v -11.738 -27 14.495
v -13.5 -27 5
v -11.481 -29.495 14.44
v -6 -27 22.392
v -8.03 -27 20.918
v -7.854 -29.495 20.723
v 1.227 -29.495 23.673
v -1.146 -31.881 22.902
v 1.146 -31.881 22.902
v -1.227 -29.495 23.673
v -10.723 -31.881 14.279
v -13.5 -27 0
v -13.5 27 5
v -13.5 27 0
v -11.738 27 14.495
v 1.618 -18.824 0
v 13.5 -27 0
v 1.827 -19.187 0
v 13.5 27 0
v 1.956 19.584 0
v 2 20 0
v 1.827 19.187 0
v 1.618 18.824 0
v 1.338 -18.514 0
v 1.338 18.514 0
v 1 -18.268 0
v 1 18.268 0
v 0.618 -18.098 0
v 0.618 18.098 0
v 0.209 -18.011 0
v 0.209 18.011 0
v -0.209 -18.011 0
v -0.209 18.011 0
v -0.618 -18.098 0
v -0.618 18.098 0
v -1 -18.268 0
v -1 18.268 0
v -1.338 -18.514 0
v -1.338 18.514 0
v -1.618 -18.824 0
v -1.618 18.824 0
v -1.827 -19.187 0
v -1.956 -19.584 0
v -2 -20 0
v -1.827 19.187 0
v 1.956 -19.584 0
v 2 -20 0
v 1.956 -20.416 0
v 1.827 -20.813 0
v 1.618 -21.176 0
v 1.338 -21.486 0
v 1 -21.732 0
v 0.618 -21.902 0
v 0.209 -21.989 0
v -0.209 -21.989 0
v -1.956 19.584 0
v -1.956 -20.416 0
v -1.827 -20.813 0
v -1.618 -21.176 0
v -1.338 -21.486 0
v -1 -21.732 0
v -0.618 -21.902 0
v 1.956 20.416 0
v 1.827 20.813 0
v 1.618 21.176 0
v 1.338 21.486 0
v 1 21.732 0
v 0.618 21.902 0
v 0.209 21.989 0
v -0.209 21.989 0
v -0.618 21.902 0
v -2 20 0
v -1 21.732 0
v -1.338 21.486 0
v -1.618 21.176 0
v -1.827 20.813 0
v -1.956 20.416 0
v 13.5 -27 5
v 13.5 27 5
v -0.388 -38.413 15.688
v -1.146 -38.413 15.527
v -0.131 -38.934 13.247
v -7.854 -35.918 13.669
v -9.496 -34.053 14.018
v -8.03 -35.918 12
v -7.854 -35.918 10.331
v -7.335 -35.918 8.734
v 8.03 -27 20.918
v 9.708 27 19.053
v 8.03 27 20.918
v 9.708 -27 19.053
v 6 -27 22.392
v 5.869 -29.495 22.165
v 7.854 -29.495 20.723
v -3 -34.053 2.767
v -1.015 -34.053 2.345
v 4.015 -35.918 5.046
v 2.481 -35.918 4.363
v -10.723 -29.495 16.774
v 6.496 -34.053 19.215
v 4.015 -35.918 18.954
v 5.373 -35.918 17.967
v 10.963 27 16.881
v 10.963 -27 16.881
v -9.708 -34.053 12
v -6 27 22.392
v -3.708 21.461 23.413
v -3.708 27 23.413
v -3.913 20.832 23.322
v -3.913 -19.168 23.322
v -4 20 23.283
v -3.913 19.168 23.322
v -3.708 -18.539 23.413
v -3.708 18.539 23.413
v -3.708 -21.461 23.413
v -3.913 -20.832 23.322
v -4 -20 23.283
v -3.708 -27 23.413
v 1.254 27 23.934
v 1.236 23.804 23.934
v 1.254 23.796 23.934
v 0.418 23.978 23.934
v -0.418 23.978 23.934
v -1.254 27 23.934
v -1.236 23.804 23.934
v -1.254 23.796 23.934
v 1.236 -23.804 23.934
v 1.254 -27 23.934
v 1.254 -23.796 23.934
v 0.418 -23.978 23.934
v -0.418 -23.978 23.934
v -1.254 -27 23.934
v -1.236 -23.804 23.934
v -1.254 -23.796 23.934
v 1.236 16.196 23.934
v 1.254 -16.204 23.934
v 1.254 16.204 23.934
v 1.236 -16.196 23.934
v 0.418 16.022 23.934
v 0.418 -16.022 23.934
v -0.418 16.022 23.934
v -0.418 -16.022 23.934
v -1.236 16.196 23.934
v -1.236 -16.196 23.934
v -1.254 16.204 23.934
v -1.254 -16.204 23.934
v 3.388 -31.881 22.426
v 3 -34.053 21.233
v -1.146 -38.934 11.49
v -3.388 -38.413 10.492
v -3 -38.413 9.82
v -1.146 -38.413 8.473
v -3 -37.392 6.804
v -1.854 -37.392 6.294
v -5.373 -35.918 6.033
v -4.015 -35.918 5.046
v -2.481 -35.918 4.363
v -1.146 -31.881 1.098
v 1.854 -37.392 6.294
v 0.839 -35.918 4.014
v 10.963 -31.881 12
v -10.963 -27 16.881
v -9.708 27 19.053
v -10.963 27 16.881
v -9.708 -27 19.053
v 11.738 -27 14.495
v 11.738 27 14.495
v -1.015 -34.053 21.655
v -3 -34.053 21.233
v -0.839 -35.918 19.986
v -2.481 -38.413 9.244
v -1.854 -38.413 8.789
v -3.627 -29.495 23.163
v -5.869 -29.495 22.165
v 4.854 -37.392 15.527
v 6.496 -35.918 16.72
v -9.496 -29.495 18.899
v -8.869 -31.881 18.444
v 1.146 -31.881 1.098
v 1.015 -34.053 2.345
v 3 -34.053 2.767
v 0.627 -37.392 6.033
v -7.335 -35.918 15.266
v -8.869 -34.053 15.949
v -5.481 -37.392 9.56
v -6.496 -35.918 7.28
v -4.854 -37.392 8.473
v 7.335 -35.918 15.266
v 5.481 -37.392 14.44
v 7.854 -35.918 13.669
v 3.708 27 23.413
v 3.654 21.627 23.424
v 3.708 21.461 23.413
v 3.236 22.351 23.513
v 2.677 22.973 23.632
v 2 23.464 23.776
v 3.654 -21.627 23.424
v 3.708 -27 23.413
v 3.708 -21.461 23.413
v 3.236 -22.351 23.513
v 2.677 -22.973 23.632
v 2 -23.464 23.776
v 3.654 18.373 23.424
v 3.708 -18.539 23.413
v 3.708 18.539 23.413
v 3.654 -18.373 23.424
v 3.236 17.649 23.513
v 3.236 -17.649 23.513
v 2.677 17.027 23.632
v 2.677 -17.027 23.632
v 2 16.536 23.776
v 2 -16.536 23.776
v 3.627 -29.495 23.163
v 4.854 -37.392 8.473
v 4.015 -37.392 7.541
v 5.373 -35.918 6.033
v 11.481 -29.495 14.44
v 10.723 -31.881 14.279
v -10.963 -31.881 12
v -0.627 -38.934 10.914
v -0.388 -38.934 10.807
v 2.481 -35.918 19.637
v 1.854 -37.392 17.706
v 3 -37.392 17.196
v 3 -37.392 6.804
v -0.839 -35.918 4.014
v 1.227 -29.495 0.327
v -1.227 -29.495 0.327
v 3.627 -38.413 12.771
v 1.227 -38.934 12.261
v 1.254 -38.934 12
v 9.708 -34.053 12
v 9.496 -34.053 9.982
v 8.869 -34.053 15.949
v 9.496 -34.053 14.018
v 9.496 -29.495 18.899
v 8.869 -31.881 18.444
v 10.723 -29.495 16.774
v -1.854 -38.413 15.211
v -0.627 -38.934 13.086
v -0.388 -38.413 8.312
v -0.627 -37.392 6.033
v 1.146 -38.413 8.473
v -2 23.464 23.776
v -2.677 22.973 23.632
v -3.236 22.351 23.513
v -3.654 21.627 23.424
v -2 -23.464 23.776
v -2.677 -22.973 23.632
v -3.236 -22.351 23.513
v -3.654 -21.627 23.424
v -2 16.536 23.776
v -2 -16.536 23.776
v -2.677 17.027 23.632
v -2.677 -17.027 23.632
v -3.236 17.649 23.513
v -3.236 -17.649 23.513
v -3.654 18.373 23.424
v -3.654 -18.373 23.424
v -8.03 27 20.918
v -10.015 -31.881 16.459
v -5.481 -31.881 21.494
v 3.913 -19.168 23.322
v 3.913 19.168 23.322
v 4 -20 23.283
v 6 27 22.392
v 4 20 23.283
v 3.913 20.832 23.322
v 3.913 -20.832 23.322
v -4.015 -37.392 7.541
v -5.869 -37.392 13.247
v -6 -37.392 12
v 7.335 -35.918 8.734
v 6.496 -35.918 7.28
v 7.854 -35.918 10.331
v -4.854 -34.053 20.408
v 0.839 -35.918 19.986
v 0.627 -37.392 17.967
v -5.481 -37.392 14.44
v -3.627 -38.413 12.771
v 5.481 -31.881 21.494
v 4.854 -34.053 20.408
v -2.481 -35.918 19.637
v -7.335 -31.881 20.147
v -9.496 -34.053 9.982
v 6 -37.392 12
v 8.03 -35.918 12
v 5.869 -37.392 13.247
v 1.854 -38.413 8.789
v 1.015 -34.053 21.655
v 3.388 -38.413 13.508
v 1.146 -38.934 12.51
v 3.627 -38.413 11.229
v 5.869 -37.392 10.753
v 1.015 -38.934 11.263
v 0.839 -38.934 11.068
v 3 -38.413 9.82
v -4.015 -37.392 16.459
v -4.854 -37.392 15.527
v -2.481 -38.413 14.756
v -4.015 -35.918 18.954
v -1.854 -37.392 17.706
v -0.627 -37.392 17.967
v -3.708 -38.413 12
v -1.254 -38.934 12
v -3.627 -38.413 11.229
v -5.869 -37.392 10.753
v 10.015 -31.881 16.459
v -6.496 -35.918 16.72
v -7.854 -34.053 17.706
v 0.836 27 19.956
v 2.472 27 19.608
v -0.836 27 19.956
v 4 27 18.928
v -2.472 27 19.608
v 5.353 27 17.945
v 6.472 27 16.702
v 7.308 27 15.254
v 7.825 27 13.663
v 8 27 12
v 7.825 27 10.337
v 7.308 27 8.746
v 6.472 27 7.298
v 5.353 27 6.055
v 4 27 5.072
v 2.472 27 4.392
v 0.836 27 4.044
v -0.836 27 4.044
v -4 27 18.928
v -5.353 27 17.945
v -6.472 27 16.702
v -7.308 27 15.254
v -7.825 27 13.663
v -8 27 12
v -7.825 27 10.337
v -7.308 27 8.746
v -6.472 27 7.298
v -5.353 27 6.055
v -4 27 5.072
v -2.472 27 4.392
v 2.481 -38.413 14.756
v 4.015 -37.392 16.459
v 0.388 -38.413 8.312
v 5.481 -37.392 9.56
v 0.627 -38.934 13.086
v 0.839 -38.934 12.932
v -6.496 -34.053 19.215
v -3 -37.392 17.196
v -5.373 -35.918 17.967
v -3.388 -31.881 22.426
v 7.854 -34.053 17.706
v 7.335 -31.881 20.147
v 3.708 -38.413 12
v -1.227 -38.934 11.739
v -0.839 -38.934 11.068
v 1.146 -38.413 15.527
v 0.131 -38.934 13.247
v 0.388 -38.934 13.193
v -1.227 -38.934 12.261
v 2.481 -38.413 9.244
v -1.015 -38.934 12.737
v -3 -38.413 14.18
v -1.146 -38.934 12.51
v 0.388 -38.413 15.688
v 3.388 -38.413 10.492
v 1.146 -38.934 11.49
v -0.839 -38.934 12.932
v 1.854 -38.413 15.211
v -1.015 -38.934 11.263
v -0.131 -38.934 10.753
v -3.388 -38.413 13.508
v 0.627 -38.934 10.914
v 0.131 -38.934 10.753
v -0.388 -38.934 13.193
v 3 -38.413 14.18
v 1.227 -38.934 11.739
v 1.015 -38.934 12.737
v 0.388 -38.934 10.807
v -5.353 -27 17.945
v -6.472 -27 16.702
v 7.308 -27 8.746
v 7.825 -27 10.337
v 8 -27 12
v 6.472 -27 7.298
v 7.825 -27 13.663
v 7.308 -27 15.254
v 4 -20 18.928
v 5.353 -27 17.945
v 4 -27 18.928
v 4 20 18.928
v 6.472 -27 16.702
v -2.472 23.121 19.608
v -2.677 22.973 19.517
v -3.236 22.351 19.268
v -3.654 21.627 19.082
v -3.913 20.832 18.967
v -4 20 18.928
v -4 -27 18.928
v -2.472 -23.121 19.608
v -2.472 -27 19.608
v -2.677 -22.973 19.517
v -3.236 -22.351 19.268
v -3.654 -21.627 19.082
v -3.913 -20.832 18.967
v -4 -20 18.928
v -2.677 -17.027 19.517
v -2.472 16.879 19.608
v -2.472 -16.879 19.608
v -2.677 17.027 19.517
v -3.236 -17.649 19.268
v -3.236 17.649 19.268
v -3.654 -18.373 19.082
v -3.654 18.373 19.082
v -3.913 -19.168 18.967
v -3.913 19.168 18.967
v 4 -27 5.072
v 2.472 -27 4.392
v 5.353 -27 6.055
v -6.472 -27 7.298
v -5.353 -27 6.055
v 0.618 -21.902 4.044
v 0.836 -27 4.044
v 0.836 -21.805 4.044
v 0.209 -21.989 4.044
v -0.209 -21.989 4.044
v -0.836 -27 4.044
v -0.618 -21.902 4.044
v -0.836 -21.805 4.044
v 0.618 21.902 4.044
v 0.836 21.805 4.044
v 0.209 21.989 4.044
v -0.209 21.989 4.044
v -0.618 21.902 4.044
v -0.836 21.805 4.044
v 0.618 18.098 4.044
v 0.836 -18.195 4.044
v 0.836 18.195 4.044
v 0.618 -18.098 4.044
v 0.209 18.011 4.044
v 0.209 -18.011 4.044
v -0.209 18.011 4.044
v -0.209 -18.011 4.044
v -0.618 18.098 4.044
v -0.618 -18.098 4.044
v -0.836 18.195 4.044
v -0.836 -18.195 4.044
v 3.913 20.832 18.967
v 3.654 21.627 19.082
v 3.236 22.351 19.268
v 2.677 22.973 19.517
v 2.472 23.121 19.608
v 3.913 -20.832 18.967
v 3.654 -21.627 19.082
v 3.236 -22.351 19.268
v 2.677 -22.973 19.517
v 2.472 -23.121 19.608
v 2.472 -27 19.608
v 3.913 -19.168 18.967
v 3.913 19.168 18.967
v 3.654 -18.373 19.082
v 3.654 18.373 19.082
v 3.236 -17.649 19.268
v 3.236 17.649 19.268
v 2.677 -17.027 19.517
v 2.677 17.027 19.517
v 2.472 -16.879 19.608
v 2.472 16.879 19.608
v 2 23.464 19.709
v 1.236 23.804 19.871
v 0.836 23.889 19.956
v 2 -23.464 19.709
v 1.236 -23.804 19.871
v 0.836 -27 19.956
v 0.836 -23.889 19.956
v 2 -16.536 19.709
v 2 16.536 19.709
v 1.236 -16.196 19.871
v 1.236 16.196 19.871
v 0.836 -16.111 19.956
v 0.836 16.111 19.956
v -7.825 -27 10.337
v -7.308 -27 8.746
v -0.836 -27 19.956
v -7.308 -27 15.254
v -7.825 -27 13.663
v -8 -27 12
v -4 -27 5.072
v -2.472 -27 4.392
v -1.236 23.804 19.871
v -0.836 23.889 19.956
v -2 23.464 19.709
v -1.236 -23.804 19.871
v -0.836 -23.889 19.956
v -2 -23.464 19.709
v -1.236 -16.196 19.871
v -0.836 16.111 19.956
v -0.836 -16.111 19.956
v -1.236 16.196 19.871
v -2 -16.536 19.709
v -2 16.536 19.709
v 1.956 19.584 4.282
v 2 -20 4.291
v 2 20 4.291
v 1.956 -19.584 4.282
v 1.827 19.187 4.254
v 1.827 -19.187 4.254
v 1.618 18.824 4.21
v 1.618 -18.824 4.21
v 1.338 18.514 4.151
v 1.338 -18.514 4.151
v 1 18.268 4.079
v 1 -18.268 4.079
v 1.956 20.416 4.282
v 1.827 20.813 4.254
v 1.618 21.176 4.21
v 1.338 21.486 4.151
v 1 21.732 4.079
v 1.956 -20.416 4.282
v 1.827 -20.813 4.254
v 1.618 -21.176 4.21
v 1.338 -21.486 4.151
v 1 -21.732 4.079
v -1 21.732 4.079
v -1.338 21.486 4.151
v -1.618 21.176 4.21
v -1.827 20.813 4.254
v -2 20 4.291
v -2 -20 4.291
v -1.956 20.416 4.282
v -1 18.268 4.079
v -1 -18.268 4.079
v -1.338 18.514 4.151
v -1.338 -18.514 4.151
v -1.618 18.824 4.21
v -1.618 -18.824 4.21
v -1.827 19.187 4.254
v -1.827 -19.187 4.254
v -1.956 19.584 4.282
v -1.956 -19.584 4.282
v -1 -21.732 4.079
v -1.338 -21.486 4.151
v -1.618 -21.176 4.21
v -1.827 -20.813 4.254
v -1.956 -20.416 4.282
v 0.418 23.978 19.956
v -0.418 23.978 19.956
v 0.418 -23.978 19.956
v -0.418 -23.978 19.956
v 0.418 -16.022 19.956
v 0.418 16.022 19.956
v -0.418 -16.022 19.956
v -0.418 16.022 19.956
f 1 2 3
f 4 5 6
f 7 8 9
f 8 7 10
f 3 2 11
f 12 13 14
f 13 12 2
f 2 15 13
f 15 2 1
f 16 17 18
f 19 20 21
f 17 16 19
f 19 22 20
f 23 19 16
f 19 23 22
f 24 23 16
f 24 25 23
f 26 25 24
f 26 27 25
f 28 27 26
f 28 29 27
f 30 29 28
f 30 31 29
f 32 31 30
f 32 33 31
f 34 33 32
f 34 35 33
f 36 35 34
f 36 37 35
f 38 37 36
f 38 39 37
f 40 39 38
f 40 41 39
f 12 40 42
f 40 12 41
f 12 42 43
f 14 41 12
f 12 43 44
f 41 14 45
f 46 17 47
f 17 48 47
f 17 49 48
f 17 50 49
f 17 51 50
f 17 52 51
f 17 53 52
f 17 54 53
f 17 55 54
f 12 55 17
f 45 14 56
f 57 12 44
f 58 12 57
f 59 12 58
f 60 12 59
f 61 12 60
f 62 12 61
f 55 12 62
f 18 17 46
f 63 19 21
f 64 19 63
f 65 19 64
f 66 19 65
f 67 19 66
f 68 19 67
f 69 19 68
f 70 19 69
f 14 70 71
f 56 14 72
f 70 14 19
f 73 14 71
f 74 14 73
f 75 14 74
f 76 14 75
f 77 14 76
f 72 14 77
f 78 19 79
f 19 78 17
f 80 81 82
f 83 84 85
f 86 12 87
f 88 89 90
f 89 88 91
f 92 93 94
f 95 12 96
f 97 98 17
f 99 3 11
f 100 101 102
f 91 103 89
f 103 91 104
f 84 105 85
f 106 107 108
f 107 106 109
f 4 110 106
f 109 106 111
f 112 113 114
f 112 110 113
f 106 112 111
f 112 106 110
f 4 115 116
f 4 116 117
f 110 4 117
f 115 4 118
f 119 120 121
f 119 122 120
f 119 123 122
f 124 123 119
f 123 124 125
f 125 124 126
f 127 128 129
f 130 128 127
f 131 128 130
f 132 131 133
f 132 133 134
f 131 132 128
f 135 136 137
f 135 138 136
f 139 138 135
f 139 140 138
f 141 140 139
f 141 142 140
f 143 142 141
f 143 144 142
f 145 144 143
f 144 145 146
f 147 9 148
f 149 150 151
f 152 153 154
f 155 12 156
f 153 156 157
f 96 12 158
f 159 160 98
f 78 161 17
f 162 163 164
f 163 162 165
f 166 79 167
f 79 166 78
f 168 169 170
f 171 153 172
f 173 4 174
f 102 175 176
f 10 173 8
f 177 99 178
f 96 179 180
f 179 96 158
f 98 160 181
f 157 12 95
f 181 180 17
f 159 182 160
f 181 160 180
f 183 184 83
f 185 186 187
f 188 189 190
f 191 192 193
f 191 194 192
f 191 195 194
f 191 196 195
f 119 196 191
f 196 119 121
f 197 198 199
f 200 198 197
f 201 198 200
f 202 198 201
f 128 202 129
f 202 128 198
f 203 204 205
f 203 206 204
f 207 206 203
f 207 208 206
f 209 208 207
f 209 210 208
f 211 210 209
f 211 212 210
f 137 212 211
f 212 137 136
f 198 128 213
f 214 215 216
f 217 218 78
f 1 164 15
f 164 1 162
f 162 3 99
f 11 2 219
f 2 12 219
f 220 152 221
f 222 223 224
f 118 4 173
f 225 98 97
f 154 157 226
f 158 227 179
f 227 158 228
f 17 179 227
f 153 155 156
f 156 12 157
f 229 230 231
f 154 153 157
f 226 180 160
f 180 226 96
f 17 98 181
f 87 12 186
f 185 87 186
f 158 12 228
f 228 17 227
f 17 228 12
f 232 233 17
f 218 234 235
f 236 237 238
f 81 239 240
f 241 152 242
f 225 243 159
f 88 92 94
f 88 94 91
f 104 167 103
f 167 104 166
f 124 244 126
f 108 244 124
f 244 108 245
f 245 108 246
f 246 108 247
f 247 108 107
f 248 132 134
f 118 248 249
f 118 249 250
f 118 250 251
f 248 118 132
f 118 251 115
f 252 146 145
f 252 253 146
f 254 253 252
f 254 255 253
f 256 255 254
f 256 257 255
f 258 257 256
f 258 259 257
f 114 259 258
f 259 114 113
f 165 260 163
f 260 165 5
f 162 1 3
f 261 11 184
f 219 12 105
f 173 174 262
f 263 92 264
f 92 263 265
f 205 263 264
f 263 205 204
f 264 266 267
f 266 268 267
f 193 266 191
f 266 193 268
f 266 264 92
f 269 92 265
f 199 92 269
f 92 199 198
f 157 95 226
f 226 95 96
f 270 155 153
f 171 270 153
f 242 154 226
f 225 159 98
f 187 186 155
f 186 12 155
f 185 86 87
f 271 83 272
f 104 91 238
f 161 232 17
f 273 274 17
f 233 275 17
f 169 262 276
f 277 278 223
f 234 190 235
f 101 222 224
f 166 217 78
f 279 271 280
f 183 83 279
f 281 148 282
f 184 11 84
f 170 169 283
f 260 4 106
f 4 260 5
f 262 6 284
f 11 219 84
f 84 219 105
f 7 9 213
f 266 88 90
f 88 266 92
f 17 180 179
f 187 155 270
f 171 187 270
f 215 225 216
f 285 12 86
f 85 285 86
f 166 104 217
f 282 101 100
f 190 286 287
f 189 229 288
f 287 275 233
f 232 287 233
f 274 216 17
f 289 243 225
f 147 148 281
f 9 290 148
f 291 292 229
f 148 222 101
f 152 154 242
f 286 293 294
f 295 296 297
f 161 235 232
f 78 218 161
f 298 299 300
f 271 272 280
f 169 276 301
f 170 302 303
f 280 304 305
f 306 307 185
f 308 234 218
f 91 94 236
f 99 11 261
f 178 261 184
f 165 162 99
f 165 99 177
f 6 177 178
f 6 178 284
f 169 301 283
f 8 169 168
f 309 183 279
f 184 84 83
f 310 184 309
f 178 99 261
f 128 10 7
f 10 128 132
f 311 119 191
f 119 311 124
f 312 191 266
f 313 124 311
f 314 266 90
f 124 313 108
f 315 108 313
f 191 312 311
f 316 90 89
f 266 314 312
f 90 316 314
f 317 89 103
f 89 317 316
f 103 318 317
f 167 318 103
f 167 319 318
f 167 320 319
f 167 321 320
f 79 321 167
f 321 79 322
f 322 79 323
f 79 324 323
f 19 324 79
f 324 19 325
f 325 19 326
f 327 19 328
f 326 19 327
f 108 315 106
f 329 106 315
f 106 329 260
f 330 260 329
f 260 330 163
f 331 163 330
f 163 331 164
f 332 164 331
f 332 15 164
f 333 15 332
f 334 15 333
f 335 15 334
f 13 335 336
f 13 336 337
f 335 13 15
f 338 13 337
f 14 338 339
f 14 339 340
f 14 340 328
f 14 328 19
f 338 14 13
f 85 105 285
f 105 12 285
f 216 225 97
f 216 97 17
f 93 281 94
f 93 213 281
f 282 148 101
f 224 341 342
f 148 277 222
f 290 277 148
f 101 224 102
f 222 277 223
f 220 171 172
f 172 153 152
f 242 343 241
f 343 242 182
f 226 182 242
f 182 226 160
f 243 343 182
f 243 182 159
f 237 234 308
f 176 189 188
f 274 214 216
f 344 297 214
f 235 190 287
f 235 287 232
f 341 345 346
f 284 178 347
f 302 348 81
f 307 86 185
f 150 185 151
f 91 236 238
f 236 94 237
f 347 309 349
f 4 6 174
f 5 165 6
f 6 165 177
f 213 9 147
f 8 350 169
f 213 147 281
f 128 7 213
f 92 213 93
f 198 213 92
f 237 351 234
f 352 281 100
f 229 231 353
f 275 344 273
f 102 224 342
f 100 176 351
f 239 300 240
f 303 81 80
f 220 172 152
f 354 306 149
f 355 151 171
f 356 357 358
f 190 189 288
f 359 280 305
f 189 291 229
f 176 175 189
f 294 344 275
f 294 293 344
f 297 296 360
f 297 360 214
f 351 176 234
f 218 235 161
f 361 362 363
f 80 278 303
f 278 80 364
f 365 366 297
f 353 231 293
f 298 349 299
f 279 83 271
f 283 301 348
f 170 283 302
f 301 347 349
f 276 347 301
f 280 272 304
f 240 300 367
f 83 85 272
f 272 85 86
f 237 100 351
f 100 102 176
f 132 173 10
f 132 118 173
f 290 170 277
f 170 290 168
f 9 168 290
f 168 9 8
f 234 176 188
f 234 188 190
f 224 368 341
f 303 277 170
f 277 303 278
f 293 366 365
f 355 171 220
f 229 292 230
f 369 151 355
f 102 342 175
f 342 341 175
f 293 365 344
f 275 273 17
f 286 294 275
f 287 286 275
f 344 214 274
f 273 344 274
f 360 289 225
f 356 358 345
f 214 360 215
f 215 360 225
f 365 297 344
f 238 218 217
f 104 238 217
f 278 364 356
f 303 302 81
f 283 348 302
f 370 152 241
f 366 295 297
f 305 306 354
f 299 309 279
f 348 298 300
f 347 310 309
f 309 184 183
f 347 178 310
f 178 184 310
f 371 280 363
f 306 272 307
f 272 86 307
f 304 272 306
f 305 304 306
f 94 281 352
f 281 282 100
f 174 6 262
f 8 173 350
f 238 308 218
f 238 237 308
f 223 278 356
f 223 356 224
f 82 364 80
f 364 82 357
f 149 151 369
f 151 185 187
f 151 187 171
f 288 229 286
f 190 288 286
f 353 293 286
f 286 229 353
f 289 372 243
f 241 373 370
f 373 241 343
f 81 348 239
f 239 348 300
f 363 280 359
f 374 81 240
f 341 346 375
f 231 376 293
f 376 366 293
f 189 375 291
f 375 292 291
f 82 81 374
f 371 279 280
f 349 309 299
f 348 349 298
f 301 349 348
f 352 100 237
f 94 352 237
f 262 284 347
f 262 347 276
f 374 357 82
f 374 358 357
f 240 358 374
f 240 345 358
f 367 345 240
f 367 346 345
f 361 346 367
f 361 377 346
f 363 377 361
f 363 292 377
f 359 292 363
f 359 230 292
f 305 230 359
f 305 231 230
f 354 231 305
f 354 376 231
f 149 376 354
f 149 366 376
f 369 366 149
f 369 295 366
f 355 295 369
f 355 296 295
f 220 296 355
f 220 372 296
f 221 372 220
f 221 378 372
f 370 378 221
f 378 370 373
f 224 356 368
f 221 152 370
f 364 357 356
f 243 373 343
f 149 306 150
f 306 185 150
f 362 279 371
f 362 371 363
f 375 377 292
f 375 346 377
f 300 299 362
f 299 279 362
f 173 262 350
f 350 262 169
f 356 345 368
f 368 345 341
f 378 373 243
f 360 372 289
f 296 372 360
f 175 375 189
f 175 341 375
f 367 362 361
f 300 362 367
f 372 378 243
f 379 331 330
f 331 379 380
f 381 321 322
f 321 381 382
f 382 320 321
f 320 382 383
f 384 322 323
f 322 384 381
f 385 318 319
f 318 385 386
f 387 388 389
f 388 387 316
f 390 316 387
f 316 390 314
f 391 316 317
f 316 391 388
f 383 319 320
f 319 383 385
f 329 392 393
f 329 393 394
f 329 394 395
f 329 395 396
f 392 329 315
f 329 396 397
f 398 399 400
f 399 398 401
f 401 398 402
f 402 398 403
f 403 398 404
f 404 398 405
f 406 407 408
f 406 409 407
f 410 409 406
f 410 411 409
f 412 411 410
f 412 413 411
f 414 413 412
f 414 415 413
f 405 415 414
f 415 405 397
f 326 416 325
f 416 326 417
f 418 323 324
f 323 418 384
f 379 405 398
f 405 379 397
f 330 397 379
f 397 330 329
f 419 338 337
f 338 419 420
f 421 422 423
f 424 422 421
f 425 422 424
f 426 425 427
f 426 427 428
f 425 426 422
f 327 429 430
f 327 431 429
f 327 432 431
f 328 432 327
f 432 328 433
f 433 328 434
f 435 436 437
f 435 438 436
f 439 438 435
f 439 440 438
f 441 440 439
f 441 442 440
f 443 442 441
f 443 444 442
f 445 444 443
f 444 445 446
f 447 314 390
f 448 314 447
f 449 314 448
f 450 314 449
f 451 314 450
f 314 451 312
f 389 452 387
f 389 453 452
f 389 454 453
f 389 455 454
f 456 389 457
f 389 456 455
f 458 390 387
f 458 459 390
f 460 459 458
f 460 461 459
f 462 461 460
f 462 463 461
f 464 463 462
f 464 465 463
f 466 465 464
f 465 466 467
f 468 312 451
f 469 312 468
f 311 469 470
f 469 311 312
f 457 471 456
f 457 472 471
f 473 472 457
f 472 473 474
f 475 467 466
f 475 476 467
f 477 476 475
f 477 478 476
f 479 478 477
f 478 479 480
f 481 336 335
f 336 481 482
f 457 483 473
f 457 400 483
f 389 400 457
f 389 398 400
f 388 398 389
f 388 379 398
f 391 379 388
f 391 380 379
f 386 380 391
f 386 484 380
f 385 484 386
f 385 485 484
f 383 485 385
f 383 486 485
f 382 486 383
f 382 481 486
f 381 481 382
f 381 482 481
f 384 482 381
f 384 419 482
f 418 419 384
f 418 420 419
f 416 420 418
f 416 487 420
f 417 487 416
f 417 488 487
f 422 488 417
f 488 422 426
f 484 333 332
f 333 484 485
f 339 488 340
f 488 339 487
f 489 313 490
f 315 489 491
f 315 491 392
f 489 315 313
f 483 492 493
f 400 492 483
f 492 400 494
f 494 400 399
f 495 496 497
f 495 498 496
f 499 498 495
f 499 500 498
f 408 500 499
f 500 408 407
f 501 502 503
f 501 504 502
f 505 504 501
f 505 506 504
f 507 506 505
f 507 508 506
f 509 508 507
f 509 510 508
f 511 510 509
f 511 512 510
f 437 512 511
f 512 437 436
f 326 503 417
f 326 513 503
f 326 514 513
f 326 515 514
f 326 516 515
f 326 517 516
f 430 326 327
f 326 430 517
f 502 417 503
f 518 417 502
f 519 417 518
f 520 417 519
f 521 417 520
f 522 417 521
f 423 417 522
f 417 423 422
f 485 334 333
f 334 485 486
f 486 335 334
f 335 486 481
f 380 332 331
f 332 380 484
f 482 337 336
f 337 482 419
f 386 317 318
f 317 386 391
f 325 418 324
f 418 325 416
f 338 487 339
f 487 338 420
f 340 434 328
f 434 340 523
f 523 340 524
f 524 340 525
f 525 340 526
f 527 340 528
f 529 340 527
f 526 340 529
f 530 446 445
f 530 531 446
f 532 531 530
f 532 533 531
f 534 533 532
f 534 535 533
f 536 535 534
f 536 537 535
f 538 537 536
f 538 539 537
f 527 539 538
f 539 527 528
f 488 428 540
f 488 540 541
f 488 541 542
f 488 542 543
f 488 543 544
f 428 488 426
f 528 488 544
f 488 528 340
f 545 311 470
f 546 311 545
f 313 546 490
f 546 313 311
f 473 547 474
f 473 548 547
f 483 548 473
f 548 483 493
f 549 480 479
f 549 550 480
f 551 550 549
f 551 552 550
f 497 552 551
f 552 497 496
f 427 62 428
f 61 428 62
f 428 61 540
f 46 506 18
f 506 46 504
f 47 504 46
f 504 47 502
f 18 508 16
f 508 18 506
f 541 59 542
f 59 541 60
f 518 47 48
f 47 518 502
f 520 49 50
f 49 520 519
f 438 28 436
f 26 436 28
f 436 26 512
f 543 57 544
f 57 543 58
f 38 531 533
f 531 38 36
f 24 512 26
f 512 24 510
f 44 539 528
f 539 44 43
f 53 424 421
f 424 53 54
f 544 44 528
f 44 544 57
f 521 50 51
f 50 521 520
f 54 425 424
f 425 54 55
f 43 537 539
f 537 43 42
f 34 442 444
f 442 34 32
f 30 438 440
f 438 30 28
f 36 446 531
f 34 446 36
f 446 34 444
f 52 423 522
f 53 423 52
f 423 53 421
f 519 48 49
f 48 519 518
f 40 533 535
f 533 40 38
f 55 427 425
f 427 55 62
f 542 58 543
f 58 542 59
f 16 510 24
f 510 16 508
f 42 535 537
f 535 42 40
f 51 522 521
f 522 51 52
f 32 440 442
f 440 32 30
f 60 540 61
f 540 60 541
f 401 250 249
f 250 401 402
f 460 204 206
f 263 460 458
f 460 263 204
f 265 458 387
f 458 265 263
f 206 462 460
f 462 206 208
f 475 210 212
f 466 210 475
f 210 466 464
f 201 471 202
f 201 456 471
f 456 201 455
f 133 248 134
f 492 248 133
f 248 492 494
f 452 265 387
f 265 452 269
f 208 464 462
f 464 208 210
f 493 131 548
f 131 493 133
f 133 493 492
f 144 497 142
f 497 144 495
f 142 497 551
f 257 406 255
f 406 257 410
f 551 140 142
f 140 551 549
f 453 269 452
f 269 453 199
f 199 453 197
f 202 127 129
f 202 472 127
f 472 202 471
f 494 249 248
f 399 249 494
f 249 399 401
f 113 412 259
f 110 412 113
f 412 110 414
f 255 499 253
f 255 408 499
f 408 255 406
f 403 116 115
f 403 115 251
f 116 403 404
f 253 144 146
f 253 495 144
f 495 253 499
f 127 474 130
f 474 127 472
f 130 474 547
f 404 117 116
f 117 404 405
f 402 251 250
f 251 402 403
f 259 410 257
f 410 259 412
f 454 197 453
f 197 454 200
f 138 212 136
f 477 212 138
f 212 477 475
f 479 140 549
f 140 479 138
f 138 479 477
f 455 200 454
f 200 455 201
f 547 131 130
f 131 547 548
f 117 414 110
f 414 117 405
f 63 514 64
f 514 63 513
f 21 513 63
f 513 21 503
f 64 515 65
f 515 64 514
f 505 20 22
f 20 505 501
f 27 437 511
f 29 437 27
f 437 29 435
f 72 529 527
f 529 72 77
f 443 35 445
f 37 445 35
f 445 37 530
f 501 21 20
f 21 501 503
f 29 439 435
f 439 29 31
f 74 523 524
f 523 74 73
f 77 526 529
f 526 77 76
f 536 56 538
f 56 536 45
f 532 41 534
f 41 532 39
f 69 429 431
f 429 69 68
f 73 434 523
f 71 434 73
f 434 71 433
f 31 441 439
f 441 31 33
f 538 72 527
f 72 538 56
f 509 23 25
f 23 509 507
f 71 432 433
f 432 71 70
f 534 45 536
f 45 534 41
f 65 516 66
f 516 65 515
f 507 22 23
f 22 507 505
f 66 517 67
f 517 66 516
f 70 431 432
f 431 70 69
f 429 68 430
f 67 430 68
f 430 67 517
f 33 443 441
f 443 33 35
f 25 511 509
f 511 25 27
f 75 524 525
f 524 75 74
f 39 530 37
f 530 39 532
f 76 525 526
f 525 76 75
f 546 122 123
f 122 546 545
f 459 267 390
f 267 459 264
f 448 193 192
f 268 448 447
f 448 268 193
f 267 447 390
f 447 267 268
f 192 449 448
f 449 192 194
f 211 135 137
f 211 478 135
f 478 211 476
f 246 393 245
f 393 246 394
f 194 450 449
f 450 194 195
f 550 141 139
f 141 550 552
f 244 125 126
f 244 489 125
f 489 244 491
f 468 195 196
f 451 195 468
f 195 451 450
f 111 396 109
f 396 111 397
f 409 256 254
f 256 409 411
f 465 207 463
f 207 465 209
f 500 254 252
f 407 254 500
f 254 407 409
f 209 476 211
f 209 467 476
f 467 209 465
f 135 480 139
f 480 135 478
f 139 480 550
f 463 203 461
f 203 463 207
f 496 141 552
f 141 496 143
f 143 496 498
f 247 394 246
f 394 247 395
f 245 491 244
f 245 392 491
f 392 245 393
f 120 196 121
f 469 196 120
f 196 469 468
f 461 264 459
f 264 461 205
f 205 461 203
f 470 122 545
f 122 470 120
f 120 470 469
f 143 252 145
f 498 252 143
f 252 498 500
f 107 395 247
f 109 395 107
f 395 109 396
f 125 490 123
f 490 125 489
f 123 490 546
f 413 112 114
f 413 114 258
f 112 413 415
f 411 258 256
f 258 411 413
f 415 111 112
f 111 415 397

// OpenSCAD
MOUNT_HOLE_SPACING = 40;
MOUNT_HOLE_DIA = 4;

WIDTH = MOUNT_HOLE_SPACING + MOUNT_HOLE_DIA + 10;

POLE_DIA = 16;
POLE_MOUNT_DIA = POLE_DIA + 8;
POLE_MOUNT_WIDTH = WIDTH/2;
POLE_MOUNT_LENGTH = WIDTH;
POLE_MOUNT_HEIGHT = 5;

$fn = 30;

module pole_mount() {
    difference() {
        hull() {
            translate([0, -POLE_MOUNT_LENGTH/2, POLE_MOUNT_DIA/2])
                rotate([-90, 0, 0])
                    union() {
                        cylinder(d = POLE_MOUNT_DIA, h = POLE_MOUNT_LENGTH);
                        sphere(d = POLE_MOUNT_DIA);
                    }
            translate([-POLE_MOUNT_WIDTH/2, -POLE_MOUNT_LENGTH/2, 0])
                cube(size = [POLE_MOUNT_WIDTH, POLE_MOUNT_LENGTH, POLE_MOUNT_HEIGHT]);
        }
        translate([0, -POLE_MOUNT_LENGTH/2, POLE_MOUNT_DIA/2])
            rotate([-90, 0, 0])
                cylinder(d = POLE_DIA, h = POLE_MOUNT_LENGTH);

    }
}

module mounting_holes() {
    height = (POLE_MOUNT_DIA + POLE_MOUNT_HEIGHT)/2;
    union() {
        for(i = [-1, 1]) {
            translate([0, i * MOUNT_HOLE_SPACING/2, 0])
                cylinder(d = MOUNT_HOLE_DIA, h = height);
            translate([0, i * MOUNT_HOLE_SPACING/2, height])
                cylinder(d = MOUNT_HOLE_DIA*2, h = height);
        }
    }
}

difference() {
    pole_mount();
    mounting_holes();
}
